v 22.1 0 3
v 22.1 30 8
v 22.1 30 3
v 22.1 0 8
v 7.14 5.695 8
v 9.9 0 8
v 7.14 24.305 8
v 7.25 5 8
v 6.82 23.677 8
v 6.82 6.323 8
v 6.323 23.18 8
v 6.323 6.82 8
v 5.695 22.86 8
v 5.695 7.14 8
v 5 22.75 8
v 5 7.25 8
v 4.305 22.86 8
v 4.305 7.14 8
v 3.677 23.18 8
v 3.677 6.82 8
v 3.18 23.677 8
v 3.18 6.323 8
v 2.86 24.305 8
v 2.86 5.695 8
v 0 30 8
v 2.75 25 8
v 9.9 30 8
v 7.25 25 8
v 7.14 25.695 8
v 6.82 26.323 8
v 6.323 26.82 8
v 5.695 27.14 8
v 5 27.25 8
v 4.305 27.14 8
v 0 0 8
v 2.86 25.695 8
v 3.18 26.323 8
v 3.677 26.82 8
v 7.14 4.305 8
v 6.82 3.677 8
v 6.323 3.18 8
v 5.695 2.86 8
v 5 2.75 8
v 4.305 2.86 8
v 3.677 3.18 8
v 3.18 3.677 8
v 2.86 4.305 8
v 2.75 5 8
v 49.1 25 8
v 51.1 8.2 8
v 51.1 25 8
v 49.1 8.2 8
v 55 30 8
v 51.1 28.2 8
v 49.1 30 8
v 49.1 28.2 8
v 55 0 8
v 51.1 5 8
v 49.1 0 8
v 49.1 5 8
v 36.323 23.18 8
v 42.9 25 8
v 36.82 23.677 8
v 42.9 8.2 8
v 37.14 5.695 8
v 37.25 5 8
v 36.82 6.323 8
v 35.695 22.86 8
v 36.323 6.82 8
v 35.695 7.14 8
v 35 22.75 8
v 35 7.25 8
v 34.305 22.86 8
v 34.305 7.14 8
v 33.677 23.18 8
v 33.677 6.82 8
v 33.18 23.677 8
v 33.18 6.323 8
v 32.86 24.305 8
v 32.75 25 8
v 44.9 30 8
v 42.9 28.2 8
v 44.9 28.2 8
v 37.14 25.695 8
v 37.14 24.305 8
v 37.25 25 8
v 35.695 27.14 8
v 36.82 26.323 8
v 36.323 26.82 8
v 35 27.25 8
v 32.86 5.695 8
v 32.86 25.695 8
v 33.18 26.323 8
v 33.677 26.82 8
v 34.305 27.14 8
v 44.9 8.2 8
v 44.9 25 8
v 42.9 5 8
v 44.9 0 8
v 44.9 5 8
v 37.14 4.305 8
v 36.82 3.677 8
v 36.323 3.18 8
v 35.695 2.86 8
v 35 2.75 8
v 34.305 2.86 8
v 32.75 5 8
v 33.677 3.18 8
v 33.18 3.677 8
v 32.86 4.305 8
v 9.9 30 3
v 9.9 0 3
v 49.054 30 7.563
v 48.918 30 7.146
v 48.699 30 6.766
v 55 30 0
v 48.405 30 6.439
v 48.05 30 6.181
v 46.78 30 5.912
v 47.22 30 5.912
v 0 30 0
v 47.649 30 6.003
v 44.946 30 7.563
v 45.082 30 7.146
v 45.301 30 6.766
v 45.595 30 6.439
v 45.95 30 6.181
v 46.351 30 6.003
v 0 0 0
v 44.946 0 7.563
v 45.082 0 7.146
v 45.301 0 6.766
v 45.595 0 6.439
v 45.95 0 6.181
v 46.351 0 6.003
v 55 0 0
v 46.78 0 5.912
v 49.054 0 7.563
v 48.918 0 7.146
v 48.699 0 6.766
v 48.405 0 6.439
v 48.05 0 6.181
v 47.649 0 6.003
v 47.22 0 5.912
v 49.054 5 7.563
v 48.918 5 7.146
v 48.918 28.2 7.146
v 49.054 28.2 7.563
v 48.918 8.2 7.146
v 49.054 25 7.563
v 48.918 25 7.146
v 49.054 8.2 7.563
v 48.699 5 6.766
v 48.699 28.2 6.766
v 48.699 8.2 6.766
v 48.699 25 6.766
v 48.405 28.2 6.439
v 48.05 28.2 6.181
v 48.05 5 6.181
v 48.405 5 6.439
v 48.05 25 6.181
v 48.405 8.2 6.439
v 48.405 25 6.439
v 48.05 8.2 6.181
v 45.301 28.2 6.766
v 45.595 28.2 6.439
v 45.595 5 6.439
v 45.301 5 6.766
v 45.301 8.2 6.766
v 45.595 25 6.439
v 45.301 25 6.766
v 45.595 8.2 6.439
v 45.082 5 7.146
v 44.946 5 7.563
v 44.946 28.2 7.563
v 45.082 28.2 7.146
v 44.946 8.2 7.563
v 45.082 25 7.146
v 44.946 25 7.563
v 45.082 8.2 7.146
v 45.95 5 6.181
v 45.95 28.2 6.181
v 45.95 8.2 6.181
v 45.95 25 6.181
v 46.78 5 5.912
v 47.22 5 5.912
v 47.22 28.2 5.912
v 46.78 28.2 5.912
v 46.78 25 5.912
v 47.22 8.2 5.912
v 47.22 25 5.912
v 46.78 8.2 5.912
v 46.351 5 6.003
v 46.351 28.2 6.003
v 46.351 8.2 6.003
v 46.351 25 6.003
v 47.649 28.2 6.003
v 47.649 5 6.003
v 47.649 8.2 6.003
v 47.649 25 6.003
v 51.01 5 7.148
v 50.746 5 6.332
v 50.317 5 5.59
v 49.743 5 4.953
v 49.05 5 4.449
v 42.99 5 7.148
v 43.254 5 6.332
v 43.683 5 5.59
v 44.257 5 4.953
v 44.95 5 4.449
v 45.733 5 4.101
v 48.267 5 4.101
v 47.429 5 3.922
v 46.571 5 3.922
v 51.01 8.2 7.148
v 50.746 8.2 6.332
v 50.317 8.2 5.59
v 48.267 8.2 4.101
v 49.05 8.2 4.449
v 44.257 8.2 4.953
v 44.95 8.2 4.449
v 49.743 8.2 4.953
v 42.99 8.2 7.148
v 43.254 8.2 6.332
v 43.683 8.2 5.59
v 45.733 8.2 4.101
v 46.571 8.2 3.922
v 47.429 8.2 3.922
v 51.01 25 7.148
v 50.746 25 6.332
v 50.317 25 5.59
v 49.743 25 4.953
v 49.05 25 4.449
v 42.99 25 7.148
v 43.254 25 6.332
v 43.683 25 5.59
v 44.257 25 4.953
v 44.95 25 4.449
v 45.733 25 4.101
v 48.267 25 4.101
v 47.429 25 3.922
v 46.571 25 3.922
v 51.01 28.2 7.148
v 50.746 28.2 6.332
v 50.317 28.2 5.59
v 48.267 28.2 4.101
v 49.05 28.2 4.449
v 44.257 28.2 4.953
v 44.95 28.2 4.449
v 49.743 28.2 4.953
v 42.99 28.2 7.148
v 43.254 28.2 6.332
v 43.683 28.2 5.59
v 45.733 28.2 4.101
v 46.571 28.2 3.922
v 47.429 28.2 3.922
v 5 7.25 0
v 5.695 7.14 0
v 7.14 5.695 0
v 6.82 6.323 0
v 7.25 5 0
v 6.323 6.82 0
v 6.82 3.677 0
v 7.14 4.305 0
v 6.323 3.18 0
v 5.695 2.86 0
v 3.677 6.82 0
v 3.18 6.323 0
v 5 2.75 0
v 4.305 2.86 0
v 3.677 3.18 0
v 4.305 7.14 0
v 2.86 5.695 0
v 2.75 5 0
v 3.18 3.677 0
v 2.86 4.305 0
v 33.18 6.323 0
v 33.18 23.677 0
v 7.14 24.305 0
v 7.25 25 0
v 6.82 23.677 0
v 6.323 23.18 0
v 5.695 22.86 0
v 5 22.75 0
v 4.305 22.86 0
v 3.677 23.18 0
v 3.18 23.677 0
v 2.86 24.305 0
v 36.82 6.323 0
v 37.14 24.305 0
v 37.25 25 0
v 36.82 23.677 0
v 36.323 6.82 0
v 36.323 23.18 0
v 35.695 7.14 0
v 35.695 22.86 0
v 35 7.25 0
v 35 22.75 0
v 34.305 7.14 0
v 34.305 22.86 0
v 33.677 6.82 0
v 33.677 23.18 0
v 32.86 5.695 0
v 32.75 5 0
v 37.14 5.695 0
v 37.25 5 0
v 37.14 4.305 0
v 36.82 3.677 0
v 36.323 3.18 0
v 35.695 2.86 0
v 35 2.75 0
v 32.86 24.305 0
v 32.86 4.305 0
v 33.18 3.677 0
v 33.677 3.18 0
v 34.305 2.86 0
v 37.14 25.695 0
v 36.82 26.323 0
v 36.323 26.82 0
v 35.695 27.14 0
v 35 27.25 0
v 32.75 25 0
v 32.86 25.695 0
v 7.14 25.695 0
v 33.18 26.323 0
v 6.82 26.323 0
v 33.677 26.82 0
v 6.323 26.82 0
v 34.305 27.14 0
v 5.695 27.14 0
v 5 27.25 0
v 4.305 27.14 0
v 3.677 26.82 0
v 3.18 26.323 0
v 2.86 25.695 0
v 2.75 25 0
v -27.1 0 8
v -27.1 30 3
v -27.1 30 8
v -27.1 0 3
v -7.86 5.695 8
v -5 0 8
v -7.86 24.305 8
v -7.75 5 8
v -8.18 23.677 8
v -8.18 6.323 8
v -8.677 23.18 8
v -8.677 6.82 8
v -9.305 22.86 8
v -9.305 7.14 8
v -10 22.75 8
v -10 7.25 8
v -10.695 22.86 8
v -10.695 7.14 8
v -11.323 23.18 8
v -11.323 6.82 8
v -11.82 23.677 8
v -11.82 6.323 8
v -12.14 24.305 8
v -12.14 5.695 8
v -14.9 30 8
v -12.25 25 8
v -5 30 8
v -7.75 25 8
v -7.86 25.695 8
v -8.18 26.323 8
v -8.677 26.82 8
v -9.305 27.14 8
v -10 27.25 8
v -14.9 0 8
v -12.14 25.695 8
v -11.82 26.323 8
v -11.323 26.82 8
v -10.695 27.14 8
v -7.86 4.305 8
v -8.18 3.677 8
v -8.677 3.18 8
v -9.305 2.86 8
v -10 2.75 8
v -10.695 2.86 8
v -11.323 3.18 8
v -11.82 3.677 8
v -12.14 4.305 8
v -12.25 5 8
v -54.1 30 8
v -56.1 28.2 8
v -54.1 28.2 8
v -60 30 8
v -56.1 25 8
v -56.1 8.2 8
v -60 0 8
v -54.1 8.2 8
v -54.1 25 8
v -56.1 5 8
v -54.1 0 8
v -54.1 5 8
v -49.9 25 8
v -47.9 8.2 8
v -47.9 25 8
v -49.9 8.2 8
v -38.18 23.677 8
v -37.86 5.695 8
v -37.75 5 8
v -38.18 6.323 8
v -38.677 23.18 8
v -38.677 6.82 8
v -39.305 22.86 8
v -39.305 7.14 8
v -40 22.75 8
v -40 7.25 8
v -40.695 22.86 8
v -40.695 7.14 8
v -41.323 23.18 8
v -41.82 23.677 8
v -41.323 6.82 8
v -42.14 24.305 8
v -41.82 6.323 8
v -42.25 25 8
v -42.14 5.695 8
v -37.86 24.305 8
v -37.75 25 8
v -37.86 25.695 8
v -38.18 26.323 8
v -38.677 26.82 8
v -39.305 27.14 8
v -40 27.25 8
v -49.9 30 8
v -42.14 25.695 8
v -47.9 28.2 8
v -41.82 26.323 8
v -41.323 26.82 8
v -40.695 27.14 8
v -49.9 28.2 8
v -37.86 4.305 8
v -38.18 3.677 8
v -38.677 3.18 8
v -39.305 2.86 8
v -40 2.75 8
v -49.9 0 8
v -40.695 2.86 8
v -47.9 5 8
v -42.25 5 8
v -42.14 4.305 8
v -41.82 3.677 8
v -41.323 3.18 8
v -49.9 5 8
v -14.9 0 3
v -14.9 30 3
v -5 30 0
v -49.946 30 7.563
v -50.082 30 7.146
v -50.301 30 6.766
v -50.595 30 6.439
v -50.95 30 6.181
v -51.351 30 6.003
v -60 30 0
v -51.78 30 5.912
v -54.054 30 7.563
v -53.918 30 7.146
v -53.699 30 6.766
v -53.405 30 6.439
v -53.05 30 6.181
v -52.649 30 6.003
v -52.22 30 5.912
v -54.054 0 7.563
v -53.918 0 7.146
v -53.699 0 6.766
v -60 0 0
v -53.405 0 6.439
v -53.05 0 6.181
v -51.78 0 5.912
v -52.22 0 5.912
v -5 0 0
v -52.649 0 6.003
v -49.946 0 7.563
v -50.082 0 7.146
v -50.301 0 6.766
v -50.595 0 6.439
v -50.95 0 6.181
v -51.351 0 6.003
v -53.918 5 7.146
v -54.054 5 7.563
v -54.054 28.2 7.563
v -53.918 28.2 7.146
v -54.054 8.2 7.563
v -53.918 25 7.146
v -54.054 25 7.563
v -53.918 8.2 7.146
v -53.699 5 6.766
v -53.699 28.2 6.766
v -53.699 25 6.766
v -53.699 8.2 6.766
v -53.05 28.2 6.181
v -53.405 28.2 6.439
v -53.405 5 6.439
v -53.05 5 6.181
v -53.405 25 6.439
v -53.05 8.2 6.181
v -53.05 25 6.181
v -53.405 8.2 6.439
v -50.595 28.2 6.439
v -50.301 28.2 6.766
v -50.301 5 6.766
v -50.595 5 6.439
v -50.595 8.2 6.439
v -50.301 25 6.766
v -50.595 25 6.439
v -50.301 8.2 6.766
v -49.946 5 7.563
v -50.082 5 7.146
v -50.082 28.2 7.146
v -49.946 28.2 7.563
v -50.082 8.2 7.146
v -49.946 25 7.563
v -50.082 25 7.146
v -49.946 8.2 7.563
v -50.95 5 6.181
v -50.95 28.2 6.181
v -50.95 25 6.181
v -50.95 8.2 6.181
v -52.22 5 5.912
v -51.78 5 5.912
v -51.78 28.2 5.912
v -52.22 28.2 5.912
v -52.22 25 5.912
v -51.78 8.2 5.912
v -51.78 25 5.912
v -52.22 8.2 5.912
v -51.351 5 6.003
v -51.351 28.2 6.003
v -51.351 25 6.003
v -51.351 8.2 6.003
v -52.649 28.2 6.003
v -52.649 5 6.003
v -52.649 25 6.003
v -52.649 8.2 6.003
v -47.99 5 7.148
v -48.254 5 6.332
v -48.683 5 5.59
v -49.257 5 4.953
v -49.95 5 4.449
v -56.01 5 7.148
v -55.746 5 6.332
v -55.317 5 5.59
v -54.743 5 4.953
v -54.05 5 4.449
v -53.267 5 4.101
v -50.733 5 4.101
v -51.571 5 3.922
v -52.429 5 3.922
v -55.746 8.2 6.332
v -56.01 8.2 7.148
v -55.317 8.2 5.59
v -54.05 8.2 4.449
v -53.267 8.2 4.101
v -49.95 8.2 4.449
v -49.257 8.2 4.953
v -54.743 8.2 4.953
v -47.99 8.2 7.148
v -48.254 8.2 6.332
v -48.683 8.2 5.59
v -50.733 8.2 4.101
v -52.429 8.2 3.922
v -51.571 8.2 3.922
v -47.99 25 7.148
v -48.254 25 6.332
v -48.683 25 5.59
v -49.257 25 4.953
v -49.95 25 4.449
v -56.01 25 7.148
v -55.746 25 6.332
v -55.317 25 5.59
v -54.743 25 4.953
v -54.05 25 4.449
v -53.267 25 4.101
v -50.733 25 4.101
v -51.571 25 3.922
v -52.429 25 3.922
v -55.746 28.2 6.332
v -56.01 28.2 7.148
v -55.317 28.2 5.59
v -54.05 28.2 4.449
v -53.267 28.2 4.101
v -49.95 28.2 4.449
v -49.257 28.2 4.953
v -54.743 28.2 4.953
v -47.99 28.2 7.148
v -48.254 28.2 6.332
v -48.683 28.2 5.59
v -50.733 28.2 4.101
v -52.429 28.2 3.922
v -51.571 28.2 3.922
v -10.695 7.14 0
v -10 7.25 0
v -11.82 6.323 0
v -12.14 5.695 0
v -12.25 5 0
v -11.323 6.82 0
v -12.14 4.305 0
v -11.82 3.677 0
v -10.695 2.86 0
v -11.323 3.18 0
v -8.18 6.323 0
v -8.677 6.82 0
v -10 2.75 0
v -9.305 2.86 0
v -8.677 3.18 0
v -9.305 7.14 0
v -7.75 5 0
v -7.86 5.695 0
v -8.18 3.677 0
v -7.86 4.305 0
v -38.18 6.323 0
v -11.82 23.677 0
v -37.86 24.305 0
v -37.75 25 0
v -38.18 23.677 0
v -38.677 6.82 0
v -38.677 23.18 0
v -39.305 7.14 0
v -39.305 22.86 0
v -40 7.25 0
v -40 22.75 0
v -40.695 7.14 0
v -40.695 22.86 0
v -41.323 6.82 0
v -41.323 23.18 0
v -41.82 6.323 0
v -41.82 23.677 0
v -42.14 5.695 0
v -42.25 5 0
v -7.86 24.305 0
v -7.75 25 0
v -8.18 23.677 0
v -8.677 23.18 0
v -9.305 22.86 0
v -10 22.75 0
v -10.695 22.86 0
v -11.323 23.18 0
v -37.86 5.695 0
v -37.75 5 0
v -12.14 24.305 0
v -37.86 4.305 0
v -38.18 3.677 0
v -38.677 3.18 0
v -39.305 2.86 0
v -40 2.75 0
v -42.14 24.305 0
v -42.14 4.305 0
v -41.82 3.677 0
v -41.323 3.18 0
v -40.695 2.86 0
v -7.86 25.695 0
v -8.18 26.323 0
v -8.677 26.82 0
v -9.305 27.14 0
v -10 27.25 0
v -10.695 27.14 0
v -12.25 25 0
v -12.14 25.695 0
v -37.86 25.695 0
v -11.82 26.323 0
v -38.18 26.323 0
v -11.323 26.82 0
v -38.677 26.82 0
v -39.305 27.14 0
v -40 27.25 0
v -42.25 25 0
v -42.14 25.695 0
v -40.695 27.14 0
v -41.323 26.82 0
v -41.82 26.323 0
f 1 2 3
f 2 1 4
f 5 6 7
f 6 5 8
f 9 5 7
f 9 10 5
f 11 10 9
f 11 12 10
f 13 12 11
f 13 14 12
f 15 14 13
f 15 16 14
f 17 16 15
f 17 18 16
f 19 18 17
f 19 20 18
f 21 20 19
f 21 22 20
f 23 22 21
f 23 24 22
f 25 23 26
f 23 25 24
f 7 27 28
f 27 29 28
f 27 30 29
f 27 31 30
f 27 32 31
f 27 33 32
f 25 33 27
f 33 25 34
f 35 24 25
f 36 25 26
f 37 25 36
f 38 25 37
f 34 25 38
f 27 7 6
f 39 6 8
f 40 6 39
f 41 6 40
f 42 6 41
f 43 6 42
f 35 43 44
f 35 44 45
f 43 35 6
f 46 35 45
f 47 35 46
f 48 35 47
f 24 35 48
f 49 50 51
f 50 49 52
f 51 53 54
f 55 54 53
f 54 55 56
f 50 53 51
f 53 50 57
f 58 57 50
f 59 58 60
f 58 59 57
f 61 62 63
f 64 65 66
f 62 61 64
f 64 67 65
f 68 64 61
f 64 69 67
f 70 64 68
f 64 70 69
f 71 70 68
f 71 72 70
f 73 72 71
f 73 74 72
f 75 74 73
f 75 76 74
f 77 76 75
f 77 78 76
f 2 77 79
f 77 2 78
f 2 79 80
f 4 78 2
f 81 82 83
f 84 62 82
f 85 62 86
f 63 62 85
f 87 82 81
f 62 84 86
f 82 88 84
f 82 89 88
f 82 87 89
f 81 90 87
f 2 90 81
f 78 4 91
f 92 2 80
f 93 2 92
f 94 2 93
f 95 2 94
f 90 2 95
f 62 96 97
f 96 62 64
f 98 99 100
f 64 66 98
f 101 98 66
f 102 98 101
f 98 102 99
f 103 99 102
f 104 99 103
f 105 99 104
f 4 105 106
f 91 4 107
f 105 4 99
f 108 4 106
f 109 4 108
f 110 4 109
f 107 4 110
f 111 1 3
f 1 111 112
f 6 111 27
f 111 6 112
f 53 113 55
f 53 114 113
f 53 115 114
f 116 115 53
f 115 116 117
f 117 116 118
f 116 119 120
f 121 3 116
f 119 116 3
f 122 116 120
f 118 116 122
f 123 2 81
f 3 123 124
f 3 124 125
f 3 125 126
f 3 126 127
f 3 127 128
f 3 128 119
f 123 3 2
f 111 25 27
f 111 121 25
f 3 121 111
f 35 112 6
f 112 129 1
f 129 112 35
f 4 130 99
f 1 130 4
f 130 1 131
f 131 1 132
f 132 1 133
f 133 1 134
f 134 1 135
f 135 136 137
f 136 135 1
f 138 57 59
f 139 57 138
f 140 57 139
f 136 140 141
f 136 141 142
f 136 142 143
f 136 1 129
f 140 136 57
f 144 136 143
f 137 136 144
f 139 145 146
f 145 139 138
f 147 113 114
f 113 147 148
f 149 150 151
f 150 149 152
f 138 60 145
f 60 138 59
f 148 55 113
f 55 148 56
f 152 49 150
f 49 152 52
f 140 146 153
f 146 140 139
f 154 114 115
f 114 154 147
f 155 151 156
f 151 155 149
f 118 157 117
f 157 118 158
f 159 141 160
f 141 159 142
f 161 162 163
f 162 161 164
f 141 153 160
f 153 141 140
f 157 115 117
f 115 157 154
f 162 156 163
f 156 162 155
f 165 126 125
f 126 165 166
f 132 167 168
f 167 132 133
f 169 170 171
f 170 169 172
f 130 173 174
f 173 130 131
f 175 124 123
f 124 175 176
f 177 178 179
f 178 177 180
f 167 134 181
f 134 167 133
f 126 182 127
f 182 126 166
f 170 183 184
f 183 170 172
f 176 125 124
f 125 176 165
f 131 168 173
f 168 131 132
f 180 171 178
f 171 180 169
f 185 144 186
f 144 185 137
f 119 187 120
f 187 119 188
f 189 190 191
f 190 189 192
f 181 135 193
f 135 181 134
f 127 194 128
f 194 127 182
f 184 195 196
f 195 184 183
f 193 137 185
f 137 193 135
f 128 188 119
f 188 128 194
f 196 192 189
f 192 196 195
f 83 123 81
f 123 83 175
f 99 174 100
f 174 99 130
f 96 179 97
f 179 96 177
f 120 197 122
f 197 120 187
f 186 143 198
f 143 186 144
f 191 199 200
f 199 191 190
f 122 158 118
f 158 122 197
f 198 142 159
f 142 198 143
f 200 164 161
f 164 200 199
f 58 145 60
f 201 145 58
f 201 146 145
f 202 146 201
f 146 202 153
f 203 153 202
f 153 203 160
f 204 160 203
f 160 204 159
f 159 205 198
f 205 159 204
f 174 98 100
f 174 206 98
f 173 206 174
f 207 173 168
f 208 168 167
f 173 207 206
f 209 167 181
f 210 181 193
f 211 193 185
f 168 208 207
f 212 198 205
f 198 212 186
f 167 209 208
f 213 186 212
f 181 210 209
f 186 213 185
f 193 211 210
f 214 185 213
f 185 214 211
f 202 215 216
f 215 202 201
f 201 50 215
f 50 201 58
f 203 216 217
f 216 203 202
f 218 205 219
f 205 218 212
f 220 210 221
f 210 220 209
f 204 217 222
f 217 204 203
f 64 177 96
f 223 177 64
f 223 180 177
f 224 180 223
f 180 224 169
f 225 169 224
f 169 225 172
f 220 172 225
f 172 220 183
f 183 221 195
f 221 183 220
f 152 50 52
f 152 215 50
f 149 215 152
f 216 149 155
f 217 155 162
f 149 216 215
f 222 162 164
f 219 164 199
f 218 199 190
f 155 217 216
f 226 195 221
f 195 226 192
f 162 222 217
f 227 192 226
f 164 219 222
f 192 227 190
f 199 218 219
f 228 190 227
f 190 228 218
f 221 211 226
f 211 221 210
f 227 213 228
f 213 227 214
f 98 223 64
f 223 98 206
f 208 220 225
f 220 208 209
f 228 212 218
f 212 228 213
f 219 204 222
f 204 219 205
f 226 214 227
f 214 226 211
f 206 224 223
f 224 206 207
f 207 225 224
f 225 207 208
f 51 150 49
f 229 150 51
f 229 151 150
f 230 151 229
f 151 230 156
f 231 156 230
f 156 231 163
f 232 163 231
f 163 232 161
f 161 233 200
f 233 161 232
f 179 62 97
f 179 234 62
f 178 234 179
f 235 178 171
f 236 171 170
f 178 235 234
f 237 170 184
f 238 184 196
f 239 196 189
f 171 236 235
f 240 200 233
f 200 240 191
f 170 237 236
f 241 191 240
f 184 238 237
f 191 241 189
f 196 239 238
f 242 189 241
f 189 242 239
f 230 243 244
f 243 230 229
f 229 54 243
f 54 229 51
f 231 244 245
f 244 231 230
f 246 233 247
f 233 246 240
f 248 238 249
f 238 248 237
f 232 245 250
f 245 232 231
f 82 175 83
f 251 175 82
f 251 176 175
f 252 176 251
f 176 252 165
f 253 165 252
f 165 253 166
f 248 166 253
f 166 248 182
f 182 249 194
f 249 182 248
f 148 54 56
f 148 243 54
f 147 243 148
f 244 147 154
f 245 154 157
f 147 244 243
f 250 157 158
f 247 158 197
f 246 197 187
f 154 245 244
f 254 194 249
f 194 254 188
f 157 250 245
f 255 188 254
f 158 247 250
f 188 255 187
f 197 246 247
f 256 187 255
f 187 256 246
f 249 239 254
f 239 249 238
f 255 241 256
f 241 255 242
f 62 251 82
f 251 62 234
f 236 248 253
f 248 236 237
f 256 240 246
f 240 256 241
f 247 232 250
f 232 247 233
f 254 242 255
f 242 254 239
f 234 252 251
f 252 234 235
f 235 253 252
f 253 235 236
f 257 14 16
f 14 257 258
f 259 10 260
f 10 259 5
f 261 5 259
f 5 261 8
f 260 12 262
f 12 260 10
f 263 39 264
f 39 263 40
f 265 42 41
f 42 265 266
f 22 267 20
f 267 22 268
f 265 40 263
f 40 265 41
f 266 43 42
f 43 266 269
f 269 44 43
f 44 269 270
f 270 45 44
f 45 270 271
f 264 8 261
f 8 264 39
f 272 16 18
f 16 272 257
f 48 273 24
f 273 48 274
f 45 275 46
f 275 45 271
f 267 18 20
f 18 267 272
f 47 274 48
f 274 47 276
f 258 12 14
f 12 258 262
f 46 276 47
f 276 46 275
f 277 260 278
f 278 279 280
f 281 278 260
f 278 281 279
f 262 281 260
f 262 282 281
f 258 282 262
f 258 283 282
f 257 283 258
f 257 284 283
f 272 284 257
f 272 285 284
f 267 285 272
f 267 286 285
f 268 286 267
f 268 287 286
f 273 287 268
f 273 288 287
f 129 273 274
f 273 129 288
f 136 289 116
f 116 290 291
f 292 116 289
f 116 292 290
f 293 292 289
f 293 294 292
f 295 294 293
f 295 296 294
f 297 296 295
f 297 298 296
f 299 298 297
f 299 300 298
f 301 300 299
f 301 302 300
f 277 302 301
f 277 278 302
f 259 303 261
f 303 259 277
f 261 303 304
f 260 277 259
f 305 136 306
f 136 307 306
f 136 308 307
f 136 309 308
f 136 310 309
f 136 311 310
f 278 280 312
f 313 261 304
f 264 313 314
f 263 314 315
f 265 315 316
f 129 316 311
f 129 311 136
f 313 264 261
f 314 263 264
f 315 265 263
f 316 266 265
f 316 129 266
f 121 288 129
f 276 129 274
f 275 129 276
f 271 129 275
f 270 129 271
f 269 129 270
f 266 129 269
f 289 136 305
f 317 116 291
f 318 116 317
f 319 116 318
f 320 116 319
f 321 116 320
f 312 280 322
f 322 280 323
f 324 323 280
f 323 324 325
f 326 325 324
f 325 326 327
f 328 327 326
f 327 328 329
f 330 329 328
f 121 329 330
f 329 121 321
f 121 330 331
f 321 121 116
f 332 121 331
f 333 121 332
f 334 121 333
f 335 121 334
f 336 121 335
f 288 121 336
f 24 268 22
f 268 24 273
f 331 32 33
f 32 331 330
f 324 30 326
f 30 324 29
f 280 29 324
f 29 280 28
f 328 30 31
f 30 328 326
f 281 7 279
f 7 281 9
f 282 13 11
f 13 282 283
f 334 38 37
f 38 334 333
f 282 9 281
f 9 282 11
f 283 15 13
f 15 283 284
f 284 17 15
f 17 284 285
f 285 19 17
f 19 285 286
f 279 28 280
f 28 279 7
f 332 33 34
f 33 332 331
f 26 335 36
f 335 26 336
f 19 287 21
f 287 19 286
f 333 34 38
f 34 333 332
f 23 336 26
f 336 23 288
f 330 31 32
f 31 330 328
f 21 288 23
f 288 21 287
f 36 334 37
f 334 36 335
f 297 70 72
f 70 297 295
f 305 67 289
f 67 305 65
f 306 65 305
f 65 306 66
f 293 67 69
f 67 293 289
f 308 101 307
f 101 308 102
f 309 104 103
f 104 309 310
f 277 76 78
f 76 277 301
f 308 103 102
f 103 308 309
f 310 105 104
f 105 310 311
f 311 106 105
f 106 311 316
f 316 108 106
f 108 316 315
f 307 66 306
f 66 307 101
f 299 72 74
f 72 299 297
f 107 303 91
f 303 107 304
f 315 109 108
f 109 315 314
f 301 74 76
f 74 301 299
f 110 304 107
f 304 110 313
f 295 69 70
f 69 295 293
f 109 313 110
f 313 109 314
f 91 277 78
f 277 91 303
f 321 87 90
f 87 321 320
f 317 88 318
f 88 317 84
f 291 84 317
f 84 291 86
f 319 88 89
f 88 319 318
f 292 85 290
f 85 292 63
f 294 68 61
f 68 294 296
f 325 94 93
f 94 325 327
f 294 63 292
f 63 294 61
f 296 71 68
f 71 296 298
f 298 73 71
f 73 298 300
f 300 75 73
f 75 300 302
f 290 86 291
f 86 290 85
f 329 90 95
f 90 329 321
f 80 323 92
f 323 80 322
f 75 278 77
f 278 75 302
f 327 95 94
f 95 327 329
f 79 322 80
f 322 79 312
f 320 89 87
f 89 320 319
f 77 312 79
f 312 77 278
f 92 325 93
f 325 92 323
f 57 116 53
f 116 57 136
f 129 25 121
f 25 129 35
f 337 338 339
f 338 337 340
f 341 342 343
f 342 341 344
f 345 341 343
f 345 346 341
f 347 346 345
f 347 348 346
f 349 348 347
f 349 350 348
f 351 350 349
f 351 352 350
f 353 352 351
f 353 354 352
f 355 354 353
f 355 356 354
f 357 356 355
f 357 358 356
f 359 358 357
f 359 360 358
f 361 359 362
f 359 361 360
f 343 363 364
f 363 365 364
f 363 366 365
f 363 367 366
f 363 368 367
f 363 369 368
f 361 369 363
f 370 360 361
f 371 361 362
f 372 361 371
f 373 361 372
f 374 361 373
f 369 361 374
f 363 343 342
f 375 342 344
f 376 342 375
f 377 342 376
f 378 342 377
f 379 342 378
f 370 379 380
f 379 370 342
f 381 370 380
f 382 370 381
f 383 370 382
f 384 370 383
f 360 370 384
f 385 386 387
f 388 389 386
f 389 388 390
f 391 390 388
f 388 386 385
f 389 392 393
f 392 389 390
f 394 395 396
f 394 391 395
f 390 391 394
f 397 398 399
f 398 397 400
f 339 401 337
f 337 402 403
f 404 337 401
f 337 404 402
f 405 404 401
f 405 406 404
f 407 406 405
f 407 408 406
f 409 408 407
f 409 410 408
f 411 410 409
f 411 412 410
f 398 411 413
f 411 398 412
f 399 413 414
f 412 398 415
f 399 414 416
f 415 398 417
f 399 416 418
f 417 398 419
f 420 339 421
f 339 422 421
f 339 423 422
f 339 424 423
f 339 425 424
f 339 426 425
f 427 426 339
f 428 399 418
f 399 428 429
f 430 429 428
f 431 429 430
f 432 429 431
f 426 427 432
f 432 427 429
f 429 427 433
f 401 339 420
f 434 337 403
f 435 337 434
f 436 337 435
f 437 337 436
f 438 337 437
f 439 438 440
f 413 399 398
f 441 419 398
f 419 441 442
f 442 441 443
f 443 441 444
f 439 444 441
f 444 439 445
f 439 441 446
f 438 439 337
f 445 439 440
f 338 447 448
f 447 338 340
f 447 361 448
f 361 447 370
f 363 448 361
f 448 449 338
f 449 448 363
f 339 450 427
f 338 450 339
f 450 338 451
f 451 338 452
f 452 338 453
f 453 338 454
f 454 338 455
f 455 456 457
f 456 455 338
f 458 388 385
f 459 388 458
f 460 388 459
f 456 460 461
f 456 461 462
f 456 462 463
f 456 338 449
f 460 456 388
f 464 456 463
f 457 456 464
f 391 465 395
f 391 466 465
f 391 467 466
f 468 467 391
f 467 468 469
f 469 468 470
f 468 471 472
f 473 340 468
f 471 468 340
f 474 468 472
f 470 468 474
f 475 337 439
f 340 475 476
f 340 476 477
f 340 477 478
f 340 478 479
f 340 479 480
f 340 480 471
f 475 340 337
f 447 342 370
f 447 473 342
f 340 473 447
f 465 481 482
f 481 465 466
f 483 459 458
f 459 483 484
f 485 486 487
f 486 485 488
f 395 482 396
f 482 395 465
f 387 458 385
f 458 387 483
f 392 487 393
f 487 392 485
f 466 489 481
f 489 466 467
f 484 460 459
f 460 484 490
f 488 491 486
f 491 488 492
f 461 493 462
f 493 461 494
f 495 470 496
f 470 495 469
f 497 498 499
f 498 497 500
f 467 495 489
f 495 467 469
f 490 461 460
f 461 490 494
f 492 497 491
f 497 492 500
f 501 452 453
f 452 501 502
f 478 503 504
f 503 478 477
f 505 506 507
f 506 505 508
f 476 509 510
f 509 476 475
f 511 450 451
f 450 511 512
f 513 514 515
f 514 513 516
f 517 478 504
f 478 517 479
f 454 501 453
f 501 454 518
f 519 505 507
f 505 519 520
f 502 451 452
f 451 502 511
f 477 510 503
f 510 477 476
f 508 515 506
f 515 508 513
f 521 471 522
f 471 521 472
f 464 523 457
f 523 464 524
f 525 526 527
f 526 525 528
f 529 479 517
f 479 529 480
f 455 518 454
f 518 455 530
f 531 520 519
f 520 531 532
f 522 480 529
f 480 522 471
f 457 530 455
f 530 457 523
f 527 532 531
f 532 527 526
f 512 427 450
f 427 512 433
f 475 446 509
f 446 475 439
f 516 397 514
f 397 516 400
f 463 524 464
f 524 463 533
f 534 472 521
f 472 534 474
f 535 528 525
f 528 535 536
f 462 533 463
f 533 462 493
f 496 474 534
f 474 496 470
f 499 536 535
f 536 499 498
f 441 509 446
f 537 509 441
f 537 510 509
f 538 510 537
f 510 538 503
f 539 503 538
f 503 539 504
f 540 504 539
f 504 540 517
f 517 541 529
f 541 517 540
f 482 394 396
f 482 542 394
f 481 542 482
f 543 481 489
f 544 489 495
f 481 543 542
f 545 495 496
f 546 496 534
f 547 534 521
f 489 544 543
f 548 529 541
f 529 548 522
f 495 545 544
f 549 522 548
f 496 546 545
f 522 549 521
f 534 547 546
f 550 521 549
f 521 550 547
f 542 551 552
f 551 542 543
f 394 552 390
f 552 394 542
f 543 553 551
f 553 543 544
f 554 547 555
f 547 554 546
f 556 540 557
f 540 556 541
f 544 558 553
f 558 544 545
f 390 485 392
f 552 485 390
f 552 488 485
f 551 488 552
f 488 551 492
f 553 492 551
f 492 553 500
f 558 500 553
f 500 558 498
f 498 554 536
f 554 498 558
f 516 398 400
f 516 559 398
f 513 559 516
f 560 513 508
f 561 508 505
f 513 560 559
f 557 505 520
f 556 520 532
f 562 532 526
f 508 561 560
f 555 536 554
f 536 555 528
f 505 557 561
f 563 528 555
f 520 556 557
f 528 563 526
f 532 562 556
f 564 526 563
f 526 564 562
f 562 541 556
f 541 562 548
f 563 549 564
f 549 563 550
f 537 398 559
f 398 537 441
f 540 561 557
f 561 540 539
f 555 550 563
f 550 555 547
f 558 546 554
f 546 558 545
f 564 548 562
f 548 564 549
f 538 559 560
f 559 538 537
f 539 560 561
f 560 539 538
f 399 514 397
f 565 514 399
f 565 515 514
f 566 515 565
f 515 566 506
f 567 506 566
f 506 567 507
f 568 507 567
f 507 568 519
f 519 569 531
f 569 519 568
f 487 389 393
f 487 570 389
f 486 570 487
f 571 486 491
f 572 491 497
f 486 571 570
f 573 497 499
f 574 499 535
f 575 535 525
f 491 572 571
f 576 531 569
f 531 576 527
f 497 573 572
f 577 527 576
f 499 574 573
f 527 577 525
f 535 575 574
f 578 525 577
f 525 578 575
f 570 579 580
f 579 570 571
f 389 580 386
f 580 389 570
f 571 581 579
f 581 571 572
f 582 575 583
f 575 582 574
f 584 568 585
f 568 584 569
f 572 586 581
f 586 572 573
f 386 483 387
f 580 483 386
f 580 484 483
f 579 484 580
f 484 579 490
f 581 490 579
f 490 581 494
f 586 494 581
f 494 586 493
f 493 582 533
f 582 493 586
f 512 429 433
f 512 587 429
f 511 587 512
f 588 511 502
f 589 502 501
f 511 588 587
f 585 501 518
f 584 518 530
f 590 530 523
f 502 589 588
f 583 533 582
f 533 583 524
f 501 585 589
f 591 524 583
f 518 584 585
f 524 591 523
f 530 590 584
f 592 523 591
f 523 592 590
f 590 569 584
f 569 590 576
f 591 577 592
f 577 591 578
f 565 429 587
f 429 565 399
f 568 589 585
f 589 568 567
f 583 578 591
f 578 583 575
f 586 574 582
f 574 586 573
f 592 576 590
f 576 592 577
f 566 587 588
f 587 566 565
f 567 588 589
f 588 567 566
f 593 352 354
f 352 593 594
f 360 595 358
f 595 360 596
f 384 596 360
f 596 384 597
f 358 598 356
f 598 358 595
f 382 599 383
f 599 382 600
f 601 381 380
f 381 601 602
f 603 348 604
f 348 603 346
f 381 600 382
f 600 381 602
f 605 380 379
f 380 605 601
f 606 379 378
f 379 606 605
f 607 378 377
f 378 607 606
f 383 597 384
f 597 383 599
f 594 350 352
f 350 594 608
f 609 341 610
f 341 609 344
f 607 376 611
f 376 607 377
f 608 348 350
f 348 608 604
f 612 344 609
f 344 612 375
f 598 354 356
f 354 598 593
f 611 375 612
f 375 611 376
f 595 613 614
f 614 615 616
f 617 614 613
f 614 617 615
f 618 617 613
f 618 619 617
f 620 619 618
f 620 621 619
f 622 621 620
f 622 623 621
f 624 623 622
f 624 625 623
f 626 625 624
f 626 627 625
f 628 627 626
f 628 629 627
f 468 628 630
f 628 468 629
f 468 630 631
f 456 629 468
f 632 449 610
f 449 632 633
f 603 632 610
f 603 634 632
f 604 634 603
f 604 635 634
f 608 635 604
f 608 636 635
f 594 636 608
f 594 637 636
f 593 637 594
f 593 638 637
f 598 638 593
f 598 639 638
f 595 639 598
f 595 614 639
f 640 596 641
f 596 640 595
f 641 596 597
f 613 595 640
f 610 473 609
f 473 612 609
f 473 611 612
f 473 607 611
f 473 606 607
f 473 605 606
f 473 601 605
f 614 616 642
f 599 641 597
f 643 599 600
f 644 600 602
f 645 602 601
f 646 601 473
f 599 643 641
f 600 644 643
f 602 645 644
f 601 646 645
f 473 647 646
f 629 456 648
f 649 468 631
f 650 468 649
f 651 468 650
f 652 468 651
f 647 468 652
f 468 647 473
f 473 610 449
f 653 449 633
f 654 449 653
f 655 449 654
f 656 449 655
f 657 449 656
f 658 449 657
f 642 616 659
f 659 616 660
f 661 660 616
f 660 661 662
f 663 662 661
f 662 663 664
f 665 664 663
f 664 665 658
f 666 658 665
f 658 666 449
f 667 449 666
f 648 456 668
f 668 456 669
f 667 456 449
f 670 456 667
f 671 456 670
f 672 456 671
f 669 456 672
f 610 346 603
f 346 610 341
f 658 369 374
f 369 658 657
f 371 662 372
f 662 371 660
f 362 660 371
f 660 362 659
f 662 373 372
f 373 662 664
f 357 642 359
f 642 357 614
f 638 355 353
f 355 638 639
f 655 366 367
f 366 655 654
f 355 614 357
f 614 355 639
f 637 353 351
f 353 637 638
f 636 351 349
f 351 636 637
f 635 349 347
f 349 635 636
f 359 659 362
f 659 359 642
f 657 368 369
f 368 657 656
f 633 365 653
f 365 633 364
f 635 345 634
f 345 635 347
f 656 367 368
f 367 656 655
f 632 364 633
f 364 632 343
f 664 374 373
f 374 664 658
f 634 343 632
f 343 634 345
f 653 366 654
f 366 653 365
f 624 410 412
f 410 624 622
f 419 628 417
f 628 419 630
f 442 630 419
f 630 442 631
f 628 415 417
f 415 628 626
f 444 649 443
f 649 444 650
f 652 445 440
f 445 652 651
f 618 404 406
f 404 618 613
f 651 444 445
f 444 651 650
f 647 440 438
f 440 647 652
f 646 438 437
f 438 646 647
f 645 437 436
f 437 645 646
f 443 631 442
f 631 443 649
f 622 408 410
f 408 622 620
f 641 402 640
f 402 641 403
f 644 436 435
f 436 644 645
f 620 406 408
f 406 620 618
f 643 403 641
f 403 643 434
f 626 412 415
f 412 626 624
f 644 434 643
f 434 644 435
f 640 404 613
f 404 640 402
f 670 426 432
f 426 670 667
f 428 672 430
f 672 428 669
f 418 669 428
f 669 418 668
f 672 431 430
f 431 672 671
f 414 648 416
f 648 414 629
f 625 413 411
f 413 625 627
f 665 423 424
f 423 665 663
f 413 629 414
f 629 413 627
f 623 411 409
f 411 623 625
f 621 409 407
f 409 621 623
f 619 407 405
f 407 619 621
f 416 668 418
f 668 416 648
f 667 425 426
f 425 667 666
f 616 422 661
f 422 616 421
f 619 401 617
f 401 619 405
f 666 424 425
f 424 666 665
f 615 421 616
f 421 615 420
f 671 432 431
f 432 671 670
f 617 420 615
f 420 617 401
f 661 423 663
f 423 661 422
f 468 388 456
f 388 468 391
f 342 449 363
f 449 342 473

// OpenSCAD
h=8;
l=55;
w=30;
d=31;
module a(){
    difference(){
        cube([l,w,h]);
        union(){
            translate([10-0.1,0,h-5])cube([12+0.2,w,5]);
            translate([d+16,0,h])rotate([-90,0,0])cylinder(h=w,r=2.1,$fn=30);
            translate([d+16,5,h])rotate([-90,0,0])cylinder(h=3.2,r=4.1,$fn=30);
            translate([d+16,25,h])rotate([-90,0,0])cylinder(h=3.2,r=4.1,$fn=30);
            translate([5,5,0])cylinder(h=h,r=2.25,$fn=20);
            translate([5,25,0])cylinder(h=h,r=2.25,$fn=20);
            translate([35,5,0])cylinder(h=h,r=2.25,$fn=20);
            translate([35,25,0])cylinder(h=h,r=2.25,$fn=20);
        }
    }
}
module parts(){
    translate([10+0.2,6,h-5+0.2])cube([12-0.4,24,10]);
    translate([16,w,h])rotate([-90,0,0])cylinder(h=5,r=1,$fn=30);
    translate([d+16,0,h])rotate([-90,0,0])cylinder(h=w+5,r=1.8,$fn=30);
}
//parts();
a();
translate([-5,0,0])mirror([1,0,0])a();
